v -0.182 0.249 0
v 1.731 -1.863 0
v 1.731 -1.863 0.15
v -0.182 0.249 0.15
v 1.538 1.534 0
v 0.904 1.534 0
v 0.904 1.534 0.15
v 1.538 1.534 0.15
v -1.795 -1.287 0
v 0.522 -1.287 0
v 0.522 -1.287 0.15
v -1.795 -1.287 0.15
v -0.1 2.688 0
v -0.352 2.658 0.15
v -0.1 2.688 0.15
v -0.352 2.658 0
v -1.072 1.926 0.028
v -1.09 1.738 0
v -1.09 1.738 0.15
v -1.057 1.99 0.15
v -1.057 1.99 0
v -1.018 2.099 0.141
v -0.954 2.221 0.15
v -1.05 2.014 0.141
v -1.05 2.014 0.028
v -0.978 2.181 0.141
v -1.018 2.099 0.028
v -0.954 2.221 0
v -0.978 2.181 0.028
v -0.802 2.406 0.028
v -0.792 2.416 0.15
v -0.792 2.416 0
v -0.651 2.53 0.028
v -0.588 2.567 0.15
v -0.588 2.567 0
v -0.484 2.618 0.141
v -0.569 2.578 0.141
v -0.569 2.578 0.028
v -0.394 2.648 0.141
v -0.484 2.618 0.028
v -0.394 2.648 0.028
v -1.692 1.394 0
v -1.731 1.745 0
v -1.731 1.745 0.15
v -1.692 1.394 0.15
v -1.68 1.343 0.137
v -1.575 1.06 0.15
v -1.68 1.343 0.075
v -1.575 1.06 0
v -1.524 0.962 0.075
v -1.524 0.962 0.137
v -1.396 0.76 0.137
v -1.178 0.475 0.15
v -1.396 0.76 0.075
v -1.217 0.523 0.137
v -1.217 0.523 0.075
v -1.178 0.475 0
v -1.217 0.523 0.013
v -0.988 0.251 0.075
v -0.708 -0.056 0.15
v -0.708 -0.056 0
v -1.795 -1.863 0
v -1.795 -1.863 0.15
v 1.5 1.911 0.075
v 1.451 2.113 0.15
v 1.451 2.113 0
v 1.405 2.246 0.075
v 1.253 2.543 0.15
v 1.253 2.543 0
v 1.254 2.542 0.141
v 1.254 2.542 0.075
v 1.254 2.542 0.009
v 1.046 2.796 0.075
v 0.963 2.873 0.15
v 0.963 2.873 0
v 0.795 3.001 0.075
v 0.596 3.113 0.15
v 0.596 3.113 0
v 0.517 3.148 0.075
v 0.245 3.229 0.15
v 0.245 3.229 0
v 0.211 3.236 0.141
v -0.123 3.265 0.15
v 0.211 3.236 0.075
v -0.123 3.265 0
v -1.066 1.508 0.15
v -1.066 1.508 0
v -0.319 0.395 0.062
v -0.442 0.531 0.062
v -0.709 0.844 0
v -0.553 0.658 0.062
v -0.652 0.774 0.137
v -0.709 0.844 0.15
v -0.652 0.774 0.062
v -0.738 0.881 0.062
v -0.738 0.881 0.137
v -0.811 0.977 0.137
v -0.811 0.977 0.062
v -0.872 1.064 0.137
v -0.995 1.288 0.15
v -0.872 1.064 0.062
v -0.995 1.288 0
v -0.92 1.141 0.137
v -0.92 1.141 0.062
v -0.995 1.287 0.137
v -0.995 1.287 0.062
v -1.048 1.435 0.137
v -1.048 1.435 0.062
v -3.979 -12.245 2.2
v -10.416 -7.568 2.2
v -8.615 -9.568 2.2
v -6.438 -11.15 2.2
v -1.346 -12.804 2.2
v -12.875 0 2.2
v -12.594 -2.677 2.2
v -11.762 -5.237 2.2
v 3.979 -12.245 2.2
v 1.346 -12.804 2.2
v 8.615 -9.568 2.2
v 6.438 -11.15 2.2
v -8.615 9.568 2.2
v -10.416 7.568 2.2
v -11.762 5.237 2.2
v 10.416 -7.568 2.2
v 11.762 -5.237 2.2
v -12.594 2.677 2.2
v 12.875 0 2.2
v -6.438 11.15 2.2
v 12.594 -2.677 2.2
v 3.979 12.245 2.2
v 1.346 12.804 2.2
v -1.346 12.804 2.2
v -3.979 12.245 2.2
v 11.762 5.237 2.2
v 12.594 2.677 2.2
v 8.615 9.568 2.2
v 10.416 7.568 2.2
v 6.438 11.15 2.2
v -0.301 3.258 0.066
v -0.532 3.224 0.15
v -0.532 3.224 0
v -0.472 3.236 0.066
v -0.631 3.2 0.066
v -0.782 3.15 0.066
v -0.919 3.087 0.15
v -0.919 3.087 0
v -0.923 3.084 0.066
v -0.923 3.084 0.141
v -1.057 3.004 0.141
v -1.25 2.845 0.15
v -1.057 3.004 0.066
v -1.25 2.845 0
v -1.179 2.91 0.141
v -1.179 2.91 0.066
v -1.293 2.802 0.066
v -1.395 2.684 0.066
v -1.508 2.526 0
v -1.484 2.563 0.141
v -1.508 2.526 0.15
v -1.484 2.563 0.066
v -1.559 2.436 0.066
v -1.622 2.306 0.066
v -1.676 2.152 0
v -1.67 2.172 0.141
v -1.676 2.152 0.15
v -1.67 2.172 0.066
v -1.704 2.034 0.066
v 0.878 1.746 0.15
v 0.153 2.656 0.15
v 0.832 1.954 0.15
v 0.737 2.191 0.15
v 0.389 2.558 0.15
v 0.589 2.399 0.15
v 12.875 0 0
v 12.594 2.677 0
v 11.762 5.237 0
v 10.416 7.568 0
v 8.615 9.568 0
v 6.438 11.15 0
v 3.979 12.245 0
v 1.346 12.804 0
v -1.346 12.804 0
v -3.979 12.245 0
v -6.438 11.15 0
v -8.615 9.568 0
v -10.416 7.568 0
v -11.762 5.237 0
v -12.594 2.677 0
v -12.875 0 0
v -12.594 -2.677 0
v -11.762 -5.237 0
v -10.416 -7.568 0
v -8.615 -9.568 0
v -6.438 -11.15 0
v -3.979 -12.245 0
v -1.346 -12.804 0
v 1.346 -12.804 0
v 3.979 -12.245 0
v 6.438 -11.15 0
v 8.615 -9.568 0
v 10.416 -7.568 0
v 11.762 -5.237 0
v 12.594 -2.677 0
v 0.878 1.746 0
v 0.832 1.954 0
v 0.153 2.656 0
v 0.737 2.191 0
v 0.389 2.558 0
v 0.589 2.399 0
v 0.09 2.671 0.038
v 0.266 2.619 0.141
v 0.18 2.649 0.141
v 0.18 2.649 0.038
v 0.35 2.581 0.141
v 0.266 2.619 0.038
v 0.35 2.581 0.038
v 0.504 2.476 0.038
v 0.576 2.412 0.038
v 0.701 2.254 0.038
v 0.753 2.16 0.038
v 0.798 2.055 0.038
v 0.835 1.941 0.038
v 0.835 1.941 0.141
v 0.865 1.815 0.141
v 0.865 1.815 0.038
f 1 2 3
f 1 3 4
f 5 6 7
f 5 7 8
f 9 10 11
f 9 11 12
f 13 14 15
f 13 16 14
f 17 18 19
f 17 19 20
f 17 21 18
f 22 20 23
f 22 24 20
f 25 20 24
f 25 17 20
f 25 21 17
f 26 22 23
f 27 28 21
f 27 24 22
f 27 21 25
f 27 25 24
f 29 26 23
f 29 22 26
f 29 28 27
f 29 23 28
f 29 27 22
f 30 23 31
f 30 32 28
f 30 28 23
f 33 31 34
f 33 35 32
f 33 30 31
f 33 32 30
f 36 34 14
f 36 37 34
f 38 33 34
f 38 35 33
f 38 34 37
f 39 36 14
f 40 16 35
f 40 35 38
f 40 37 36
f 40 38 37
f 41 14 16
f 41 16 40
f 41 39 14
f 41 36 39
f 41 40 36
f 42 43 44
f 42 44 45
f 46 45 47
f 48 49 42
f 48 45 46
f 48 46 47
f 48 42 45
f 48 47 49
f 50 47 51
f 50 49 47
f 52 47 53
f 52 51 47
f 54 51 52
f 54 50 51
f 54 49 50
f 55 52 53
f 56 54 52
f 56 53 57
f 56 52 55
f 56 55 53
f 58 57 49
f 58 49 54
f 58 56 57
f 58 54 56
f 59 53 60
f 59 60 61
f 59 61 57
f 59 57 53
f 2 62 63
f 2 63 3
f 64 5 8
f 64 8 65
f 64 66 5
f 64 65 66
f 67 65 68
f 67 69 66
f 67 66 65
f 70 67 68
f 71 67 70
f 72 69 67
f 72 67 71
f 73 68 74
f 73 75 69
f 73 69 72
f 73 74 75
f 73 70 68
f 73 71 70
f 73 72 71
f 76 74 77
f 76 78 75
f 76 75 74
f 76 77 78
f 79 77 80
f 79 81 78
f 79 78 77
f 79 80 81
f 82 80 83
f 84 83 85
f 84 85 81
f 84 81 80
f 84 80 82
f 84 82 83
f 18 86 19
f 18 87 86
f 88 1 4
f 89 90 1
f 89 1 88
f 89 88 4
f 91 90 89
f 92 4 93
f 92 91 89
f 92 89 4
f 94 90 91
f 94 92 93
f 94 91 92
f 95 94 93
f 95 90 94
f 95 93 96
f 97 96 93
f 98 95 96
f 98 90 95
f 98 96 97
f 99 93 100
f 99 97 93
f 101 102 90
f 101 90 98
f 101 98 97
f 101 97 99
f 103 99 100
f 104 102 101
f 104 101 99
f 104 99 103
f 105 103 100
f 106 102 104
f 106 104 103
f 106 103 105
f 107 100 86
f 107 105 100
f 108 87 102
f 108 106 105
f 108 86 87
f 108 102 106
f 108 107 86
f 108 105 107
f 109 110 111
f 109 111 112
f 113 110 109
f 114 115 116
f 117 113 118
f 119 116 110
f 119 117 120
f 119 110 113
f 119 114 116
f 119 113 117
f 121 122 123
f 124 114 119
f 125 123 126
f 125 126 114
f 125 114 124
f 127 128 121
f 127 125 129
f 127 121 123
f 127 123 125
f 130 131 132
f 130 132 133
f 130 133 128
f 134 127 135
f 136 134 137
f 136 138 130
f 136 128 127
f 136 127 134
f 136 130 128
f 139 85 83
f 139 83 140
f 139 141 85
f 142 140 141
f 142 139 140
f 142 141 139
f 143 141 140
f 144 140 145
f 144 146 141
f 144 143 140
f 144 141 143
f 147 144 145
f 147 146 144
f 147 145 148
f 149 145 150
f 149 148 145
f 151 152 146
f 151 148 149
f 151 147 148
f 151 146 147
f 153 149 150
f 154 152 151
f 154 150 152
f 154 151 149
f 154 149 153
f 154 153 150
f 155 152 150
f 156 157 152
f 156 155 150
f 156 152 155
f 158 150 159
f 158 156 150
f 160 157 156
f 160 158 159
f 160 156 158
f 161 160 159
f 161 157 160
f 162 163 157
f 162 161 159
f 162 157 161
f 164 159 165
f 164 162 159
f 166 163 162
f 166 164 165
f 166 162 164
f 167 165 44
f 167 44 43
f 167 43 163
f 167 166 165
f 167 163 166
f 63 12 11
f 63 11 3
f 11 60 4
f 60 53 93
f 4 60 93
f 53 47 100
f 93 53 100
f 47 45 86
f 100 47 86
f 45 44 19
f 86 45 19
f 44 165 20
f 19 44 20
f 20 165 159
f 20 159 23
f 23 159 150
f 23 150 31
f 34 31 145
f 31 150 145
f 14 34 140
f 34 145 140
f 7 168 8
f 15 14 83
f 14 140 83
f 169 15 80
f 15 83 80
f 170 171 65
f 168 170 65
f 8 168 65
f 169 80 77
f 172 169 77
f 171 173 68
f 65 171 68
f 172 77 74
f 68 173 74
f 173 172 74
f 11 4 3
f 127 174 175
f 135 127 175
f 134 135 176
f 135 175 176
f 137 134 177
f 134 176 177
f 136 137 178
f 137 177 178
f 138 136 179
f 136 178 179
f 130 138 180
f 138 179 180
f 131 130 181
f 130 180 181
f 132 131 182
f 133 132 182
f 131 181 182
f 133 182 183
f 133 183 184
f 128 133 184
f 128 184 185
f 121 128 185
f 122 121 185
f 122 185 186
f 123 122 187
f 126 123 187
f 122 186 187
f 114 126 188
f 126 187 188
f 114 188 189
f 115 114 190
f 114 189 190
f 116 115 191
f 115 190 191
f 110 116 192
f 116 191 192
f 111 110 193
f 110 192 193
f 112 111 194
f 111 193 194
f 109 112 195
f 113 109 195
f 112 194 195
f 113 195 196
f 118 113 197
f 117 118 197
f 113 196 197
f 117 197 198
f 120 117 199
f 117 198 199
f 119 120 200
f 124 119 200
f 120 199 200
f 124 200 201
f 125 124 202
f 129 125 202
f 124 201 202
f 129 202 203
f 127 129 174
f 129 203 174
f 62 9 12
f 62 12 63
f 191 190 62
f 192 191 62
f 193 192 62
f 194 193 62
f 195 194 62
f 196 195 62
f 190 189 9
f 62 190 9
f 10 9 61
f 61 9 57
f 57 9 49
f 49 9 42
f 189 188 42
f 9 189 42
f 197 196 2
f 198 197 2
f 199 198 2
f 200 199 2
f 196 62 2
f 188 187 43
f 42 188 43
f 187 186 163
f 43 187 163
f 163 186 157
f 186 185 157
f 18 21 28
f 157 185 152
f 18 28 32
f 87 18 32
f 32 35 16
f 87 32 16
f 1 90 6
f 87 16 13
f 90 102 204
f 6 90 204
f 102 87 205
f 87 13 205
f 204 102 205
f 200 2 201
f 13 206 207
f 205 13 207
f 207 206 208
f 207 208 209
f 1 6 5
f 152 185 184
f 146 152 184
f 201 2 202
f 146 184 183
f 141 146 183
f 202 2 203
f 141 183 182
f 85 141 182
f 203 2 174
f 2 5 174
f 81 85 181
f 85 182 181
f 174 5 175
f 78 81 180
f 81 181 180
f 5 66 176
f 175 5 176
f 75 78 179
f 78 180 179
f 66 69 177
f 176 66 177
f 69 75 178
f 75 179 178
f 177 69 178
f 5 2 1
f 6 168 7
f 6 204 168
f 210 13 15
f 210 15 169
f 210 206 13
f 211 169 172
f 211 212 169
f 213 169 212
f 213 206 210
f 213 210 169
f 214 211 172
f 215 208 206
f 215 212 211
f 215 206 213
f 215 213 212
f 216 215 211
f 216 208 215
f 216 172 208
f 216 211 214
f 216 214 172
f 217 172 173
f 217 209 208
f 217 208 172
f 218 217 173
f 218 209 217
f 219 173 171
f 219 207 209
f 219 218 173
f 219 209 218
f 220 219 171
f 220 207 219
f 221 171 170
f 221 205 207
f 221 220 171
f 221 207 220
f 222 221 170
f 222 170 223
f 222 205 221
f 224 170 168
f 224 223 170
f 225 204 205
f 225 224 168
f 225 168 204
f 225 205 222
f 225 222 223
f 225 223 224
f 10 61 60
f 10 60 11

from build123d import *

# Parameters (mm, degrees)
ESQUISSE1_R             = 12.875
BOSS_EXTRU_1_DEPTH      = 2.2
ENL_V_MAT_EXTRU_1_DEPTH = 0.15


with BuildPart() as part:
    # Esquisse1 → Boss.-Extru.1 (new body)
    with BuildSketch(Plane.XY):
        Circle(ESQUISSE1_R)
    extrude(amount=BOSS_EXTRU_1_DEPTH)

    # Esquisse2 → Enlèv. mat.-Extru.1 (cut)
    with BuildSketch(Plane(origin=(0, 0, 0), x_dir=(-1, 0, 0), z_dir=(0, 0, -1))):
        with BuildLine():
            Line((-0.904447115, 1.53394505), (-1.538461538, 1.53394505))
            add(Edge.make_bspline(
                [(-1.538461538, 1.53394505), (-1.535483382, 1.598459427), (-1.529658516, 1.724640697), (-1.50379311, 1.908500904), (-1.461892993, 2.08174412), (-1.409006202, 2.245838985), (-1.338456695, 2.398734226), (-1.257056677, 2.543095198), (-1.158788153, 2.67589638), (-1.047739352, 2.797347851), (-0.927191956, 2.90769124), (-0.797602942, 3.002838248), (-0.661162761, 3.083917548), (-0.517844585, 3.150078794), (-0.36736774, 3.201306183), (-0.210161142, 3.23858307), (-0.045723284, 3.261004233), (0.066369837, 3.263466167), (0.123197115, 3.264714281)],
                knots=[0, 0, 0, 0, 1.154964179, 2.258951466, 3.315045469, 4.34063582, 5.337653555, 6.322213479, 7.300594401, 8.285733883, 9.262436119, 10.219305053, 11.156568068, 12.097250375, 13.037875795, 13.995471444, 14.983774372, 16, 16, 16, 16], degree=3))
            add(Edge.make_bspline(
                [(0.123197115, 3.264714281), (0.182695398, 3.263497204), (0.299447482, 3.261108962), (0.469466636, 3.238635314), (0.630374203, 3.202396573), (0.782217295, 3.15290748), (0.924719266, 3.086826653), (1.058161121, 3.007140463), (1.181260152, 2.911360539), (1.294909804, 2.804188786), (1.395291833, 2.686298975), (1.485957423, 2.565094244), (1.560901311, 2.438116426), (1.623685397, 2.307684161), (1.671998742, 2.17272694), (1.706117474, 2.033793979), (1.726568813, 1.89079087), (1.729360203, 1.794093658), (1.730769231, 1.745283191)],
                knots=[0, 0, 0, 0, 1.156722346, 2.269809107, 3.328396062, 4.361258308, 5.3694338, 6.377253737, 7.377324894, 8.397019439, 9.4098266, 10.385180797, 11.337325354, 12.27255833, 13.196816462, 14.119704983, 15.050871513, 16, 16, 16, 16], degree=3))
            add(Edge.make_bspline(
                [(1.730769231, 1.745283191), (1.728205226, 1.677005358), (1.723112342, 1.541385042), (1.683895559, 1.340742568), (1.617967551, 1.14656255), (1.541814394, 0.988449086), (1.464794664, 0.86064372), (1.394114185, 0.755151869), (1.311082908, 0.641083154), (1.213920187, 0.519201159), (1.106489605, 0.386717178), (0.984523598, 0.247048886), (0.851797199, 0.0973686), (0.757138795, -0.003419183), (0.708133013, -0.055598219)],
                knots=[0, 0, 0, 0, 1.155755081, 2.295677249, 3.447123235, 4.6205014, 5.259503175, 5.973005395, 6.77029923, 7.648035671, 8.612336498, 9.658570495, 10.787814065, 12, 12, 12, 12], degree=3))
            Line((0.708133013, -0.055598219), (-0.521834936, -1.28656777))
            Line((-0.521834936, -1.28656777), (1.794871795, -1.28656777))
            Line((1.794871795, -1.28656777), (1.794871795, -1.863490847))
            Line((1.794871795, -1.863490847), (-1.730769231, -1.863490847))
            Line((-1.730769231, -1.863490847), (0.182291667, 0.24888896))
            add(Edge.make_bspline(
                [(0.182291667, 0.24888896), (0.227858241, 0.297485202), (0.315301331, 0.390742277), (0.438539985, 0.527255661), (0.549728842, 0.653460154), (0.64946069, 0.769264649), (0.735123959, 0.876225683), (0.809023164, 0.97276967), (0.870321749, 1.059352512), (0.933980622, 1.161267724), (0.997060035, 1.283436349), (1.050720551, 1.432464917), (1.082919489, 1.584655413), (1.087467776, 1.687041396), (1.08974359, 1.738271973)],
                knots=[0, 0, 0, 0, 1.341560447, 2.574479018, 3.703506985, 4.728875774, 5.651874962, 6.462761537, 7.177175968, 7.787249671, 8.88179658, 9.938774664, 10.968630673, 12, 12, 12, 12], degree=3))
            add(Edge.make_bspline(
                [(1.08974359, 1.738271973), (1.089182734, 1.770053483), (1.088072967, 1.832939638), (1.072943119, 1.92502887), (1.051630011, 2.014350301), (1.018666087, 2.099467911), (0.978950625, 2.182056297), (0.929273647, 2.261047824), (0.86962043, 2.335709759), (0.803261839, 2.40772195), (0.729867494, 2.472740803), (0.652345526, 2.531053203), (0.569742603, 2.578410458), (0.484317211, 2.619825206), (0.393413852, 2.649185553), (0.299267039, 2.671045841), (0.201137532, 2.686188903), (0.13427309, 2.687249904), (0.100160256, 2.687791204)],
                knots=[0, 0, 0, 0, 0.999432927, 1.977580462, 2.931018689, 3.885672852, 4.844657058, 5.812871023, 6.815890212, 7.849665183, 8.891901864, 9.898878619, 10.897592748, 11.885014695, 12.882178885, 13.896915602, 14.927050508, 16, 16, 16, 16], degree=3))
            add(Edge.make_bspline(
                [(0.100160256, 2.687791204), (0.067729357, 2.68712604), (0.003929265, 2.685817488), (-0.090032164, 2.67231626), (-0.180223502, 2.650333606), (-0.266949004, 2.61984166), (-0.350836809, 2.582223424), (-0.429835719, 2.533489074), (-0.505236946, 2.476796008), (-0.578037313, 2.413166576), (-0.644294043, 2.338516583), (-0.703555767, 2.25373065), (-0.755886208, 2.158716392), (-0.80061588, 2.053640023), (-0.837685545, 1.938225876), (-0.867422698, 1.812614288), (-0.890412391, 1.676750596), (-0.89968233, 1.582427495), (-0.904447115, 1.53394505)],
                knots=[0, 0, 0, 0, 0.911540883, 1.79324023, 2.663162255, 3.518366492, 4.375475705, 5.243419306, 6.122264358, 7.02676621, 7.957780629, 8.921596253, 9.930241338, 11.002848587, 12.128200329, 13.335197372, 14.630280975, 16, 16, 16, 16], degree=3))
        make_face()
    extrude(amount=-ENL_V_MAT_EXTRU_1_DEPTH, mode=Mode.SUBTRACT)


solid = part.part
